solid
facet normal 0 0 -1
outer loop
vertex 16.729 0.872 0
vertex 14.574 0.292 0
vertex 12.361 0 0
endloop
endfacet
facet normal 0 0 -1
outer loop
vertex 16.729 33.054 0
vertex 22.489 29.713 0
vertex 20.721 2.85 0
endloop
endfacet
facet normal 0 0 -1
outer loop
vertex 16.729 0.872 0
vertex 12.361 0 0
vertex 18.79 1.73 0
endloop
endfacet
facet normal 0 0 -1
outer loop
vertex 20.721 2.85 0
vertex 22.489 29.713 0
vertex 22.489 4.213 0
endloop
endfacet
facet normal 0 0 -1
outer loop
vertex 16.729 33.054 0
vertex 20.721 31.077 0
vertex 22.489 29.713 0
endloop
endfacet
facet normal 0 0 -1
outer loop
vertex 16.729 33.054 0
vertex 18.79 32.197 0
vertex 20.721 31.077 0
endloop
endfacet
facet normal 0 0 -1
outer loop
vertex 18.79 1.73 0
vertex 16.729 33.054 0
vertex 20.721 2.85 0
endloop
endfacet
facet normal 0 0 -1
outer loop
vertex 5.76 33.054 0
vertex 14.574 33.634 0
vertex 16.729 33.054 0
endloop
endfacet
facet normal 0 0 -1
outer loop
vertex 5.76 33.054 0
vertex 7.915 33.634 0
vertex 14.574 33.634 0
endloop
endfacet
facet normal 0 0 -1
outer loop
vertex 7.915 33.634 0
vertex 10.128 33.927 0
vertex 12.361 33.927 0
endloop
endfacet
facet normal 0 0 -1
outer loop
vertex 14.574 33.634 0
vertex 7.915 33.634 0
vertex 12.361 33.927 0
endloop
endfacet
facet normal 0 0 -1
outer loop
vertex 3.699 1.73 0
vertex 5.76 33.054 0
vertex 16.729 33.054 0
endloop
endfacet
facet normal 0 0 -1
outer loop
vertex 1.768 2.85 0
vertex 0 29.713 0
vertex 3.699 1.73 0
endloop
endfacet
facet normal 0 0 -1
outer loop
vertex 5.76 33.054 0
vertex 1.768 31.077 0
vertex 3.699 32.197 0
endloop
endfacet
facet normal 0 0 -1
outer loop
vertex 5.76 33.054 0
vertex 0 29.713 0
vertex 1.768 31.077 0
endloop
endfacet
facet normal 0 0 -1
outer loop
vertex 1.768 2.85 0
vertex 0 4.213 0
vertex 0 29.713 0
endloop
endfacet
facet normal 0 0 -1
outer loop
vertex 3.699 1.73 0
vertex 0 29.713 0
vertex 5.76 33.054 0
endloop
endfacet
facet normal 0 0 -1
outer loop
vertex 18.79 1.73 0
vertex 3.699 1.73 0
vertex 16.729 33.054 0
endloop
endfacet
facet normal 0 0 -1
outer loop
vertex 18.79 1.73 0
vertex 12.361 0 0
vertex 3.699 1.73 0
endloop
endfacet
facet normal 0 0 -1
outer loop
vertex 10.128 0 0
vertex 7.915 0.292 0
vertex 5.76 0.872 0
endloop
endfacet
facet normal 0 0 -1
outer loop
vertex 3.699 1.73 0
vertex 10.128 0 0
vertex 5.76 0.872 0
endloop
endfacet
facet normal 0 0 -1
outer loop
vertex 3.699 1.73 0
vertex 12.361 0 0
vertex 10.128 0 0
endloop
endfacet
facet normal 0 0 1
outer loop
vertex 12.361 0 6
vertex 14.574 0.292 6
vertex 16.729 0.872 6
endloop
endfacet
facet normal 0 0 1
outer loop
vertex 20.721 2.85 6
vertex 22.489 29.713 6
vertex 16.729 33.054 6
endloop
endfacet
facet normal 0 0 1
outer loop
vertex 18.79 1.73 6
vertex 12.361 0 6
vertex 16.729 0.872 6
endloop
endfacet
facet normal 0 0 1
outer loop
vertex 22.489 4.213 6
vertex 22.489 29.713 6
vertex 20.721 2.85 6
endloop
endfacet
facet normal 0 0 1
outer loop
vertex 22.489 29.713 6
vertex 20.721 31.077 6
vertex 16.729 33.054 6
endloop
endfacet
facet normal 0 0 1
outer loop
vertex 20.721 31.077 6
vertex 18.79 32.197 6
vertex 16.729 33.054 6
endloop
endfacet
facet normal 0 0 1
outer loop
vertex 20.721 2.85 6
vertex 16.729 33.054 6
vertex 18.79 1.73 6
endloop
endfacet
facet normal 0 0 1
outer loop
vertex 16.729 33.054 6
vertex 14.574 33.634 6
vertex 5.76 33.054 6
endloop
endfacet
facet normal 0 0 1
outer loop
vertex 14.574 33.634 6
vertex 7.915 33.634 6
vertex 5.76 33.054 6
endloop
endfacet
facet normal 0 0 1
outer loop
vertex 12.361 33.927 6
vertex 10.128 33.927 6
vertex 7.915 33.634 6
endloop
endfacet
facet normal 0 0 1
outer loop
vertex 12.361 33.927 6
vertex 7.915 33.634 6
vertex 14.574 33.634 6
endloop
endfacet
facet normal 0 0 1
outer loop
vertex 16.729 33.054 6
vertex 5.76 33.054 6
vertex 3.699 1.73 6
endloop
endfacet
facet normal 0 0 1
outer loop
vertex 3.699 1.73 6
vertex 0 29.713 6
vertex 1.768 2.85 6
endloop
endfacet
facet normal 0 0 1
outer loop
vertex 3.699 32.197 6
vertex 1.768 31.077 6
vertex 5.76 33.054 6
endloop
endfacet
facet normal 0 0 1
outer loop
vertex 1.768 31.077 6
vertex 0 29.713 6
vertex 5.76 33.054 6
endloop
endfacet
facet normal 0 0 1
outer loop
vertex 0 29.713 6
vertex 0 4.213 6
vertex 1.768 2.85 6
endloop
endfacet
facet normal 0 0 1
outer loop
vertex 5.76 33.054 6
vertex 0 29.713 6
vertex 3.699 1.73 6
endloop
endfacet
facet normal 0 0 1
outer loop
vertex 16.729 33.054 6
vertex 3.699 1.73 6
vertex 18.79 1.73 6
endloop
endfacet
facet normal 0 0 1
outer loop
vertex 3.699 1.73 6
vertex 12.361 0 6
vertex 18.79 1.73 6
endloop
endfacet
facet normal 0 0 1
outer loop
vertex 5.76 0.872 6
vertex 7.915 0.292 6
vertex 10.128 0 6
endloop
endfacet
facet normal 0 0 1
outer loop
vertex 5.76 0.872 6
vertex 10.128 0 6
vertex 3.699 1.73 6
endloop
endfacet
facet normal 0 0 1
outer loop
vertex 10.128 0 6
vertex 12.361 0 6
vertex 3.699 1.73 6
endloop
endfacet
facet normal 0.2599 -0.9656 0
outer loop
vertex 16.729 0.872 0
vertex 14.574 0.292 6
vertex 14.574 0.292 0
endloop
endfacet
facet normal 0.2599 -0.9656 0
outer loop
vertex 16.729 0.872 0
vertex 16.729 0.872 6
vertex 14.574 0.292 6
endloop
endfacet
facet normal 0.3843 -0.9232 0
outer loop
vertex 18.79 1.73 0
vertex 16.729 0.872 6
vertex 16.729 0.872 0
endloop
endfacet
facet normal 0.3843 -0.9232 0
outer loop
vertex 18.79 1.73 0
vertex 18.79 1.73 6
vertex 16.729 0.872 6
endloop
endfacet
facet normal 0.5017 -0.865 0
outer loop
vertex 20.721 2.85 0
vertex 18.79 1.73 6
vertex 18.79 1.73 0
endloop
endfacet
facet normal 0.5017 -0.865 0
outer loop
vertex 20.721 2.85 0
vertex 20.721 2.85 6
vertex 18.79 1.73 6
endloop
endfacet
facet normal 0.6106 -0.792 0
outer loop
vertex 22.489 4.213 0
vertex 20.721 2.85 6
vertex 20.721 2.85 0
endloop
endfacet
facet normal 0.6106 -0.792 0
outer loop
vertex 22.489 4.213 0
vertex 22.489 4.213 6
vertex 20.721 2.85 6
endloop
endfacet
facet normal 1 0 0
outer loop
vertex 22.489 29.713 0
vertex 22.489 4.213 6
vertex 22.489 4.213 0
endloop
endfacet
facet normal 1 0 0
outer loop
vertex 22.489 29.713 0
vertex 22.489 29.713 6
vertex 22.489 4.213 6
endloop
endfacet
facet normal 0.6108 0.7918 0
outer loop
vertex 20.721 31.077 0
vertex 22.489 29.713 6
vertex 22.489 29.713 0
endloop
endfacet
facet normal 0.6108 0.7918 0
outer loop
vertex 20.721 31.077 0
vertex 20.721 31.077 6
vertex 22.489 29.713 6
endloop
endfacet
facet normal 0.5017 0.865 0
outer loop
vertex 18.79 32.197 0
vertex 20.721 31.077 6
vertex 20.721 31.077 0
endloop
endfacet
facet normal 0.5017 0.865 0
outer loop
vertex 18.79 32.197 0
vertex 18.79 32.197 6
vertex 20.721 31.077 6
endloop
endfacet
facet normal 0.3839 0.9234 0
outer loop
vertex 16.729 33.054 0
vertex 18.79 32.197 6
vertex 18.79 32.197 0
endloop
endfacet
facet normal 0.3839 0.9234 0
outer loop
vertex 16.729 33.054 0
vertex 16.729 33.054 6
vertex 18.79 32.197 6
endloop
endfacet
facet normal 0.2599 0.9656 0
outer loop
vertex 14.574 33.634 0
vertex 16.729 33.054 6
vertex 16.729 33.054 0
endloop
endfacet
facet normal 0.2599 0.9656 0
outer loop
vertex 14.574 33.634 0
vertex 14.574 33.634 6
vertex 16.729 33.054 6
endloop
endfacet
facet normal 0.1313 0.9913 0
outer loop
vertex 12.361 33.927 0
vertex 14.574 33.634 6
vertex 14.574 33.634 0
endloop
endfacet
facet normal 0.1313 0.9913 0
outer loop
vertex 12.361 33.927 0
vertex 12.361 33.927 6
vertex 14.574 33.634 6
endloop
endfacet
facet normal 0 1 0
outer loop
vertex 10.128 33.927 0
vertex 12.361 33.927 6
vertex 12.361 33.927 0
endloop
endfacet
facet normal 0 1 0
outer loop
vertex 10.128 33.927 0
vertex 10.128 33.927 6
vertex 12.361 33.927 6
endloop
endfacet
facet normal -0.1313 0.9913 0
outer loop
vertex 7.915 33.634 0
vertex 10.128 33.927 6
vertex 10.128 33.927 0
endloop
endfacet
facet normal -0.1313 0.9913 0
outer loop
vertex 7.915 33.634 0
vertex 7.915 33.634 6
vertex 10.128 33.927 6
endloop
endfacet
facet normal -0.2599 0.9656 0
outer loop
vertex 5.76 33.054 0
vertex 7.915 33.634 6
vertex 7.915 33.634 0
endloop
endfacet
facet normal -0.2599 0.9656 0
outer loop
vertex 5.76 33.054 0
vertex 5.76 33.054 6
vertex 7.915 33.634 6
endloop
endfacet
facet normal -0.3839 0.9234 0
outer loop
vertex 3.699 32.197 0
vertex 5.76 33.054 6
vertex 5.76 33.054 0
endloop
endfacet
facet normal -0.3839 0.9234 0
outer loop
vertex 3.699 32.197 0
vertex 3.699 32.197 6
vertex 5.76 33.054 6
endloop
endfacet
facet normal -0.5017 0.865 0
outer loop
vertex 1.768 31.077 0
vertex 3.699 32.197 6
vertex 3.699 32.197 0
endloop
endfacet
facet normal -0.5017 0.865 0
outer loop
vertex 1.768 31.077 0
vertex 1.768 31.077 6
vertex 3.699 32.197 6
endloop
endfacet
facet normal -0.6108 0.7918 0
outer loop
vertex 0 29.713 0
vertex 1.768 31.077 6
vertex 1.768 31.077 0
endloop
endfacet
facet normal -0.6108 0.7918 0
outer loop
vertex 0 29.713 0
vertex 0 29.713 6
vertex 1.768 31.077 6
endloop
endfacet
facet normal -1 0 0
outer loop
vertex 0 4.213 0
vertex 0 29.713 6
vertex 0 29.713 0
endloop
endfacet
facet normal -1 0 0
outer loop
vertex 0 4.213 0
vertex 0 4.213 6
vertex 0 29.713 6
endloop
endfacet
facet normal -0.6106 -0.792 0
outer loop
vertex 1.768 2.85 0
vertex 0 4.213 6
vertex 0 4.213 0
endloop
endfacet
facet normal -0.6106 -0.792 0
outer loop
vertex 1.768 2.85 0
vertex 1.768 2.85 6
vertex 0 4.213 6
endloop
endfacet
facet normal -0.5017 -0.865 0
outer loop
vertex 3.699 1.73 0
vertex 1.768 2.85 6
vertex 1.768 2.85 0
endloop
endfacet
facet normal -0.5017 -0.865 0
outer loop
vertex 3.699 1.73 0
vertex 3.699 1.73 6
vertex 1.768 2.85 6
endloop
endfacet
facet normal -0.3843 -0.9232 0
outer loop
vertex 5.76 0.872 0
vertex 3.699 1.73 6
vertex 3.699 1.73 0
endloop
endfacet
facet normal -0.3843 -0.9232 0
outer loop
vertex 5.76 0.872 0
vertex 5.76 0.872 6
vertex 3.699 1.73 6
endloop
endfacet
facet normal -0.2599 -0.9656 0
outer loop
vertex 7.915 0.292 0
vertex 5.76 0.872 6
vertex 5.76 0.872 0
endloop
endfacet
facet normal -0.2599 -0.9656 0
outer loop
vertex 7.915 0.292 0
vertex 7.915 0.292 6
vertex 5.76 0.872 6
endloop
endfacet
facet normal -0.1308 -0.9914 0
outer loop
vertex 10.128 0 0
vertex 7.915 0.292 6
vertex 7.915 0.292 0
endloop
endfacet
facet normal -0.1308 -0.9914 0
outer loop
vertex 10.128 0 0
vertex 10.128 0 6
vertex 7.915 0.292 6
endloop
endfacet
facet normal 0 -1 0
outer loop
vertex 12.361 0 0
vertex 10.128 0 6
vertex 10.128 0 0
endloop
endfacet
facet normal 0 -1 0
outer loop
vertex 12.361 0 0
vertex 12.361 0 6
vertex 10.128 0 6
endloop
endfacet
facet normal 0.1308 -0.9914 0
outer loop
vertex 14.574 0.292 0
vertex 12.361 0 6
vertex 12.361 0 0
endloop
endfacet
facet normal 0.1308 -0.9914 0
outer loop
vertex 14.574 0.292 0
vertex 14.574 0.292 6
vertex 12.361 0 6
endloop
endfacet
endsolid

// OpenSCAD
$fn = 32;

// ----------------------------------------------------------------------
// Eccentric disc: double_d, 6 mm thick
// ----------------------------------------------------------------------

// --- parameters (mm) ---
profile_height = 6;       // extrusion height
profile_points = 24;      // points of the closed outline

profile = [[22.489, 29.713], [20.721, 31.077], [18.79, 32.197], [16.729, 33.054], [14.574, 33.634], [12.361, 33.927], [10.128, 33.927], [7.915, 33.634], [5.76, 33.054], [3.699, 32.197], [1.768, 31.077], [0, 29.713], [0, 4.213], [1.768, 2.85], [3.699, 1.73], [5.76, 0.872], [7.915, 0.292], [10.128, 0], [12.361, 0], [14.574, 0.292], [16.729, 0.872], [18.79, 1.73], [20.721, 2.85], [22.489, 4.213]];  // single closed polygon, 24 points, counter clockwise

// --- the one profile operation ---
linear_extrude(height = profile_height) polygon(points = profile);
